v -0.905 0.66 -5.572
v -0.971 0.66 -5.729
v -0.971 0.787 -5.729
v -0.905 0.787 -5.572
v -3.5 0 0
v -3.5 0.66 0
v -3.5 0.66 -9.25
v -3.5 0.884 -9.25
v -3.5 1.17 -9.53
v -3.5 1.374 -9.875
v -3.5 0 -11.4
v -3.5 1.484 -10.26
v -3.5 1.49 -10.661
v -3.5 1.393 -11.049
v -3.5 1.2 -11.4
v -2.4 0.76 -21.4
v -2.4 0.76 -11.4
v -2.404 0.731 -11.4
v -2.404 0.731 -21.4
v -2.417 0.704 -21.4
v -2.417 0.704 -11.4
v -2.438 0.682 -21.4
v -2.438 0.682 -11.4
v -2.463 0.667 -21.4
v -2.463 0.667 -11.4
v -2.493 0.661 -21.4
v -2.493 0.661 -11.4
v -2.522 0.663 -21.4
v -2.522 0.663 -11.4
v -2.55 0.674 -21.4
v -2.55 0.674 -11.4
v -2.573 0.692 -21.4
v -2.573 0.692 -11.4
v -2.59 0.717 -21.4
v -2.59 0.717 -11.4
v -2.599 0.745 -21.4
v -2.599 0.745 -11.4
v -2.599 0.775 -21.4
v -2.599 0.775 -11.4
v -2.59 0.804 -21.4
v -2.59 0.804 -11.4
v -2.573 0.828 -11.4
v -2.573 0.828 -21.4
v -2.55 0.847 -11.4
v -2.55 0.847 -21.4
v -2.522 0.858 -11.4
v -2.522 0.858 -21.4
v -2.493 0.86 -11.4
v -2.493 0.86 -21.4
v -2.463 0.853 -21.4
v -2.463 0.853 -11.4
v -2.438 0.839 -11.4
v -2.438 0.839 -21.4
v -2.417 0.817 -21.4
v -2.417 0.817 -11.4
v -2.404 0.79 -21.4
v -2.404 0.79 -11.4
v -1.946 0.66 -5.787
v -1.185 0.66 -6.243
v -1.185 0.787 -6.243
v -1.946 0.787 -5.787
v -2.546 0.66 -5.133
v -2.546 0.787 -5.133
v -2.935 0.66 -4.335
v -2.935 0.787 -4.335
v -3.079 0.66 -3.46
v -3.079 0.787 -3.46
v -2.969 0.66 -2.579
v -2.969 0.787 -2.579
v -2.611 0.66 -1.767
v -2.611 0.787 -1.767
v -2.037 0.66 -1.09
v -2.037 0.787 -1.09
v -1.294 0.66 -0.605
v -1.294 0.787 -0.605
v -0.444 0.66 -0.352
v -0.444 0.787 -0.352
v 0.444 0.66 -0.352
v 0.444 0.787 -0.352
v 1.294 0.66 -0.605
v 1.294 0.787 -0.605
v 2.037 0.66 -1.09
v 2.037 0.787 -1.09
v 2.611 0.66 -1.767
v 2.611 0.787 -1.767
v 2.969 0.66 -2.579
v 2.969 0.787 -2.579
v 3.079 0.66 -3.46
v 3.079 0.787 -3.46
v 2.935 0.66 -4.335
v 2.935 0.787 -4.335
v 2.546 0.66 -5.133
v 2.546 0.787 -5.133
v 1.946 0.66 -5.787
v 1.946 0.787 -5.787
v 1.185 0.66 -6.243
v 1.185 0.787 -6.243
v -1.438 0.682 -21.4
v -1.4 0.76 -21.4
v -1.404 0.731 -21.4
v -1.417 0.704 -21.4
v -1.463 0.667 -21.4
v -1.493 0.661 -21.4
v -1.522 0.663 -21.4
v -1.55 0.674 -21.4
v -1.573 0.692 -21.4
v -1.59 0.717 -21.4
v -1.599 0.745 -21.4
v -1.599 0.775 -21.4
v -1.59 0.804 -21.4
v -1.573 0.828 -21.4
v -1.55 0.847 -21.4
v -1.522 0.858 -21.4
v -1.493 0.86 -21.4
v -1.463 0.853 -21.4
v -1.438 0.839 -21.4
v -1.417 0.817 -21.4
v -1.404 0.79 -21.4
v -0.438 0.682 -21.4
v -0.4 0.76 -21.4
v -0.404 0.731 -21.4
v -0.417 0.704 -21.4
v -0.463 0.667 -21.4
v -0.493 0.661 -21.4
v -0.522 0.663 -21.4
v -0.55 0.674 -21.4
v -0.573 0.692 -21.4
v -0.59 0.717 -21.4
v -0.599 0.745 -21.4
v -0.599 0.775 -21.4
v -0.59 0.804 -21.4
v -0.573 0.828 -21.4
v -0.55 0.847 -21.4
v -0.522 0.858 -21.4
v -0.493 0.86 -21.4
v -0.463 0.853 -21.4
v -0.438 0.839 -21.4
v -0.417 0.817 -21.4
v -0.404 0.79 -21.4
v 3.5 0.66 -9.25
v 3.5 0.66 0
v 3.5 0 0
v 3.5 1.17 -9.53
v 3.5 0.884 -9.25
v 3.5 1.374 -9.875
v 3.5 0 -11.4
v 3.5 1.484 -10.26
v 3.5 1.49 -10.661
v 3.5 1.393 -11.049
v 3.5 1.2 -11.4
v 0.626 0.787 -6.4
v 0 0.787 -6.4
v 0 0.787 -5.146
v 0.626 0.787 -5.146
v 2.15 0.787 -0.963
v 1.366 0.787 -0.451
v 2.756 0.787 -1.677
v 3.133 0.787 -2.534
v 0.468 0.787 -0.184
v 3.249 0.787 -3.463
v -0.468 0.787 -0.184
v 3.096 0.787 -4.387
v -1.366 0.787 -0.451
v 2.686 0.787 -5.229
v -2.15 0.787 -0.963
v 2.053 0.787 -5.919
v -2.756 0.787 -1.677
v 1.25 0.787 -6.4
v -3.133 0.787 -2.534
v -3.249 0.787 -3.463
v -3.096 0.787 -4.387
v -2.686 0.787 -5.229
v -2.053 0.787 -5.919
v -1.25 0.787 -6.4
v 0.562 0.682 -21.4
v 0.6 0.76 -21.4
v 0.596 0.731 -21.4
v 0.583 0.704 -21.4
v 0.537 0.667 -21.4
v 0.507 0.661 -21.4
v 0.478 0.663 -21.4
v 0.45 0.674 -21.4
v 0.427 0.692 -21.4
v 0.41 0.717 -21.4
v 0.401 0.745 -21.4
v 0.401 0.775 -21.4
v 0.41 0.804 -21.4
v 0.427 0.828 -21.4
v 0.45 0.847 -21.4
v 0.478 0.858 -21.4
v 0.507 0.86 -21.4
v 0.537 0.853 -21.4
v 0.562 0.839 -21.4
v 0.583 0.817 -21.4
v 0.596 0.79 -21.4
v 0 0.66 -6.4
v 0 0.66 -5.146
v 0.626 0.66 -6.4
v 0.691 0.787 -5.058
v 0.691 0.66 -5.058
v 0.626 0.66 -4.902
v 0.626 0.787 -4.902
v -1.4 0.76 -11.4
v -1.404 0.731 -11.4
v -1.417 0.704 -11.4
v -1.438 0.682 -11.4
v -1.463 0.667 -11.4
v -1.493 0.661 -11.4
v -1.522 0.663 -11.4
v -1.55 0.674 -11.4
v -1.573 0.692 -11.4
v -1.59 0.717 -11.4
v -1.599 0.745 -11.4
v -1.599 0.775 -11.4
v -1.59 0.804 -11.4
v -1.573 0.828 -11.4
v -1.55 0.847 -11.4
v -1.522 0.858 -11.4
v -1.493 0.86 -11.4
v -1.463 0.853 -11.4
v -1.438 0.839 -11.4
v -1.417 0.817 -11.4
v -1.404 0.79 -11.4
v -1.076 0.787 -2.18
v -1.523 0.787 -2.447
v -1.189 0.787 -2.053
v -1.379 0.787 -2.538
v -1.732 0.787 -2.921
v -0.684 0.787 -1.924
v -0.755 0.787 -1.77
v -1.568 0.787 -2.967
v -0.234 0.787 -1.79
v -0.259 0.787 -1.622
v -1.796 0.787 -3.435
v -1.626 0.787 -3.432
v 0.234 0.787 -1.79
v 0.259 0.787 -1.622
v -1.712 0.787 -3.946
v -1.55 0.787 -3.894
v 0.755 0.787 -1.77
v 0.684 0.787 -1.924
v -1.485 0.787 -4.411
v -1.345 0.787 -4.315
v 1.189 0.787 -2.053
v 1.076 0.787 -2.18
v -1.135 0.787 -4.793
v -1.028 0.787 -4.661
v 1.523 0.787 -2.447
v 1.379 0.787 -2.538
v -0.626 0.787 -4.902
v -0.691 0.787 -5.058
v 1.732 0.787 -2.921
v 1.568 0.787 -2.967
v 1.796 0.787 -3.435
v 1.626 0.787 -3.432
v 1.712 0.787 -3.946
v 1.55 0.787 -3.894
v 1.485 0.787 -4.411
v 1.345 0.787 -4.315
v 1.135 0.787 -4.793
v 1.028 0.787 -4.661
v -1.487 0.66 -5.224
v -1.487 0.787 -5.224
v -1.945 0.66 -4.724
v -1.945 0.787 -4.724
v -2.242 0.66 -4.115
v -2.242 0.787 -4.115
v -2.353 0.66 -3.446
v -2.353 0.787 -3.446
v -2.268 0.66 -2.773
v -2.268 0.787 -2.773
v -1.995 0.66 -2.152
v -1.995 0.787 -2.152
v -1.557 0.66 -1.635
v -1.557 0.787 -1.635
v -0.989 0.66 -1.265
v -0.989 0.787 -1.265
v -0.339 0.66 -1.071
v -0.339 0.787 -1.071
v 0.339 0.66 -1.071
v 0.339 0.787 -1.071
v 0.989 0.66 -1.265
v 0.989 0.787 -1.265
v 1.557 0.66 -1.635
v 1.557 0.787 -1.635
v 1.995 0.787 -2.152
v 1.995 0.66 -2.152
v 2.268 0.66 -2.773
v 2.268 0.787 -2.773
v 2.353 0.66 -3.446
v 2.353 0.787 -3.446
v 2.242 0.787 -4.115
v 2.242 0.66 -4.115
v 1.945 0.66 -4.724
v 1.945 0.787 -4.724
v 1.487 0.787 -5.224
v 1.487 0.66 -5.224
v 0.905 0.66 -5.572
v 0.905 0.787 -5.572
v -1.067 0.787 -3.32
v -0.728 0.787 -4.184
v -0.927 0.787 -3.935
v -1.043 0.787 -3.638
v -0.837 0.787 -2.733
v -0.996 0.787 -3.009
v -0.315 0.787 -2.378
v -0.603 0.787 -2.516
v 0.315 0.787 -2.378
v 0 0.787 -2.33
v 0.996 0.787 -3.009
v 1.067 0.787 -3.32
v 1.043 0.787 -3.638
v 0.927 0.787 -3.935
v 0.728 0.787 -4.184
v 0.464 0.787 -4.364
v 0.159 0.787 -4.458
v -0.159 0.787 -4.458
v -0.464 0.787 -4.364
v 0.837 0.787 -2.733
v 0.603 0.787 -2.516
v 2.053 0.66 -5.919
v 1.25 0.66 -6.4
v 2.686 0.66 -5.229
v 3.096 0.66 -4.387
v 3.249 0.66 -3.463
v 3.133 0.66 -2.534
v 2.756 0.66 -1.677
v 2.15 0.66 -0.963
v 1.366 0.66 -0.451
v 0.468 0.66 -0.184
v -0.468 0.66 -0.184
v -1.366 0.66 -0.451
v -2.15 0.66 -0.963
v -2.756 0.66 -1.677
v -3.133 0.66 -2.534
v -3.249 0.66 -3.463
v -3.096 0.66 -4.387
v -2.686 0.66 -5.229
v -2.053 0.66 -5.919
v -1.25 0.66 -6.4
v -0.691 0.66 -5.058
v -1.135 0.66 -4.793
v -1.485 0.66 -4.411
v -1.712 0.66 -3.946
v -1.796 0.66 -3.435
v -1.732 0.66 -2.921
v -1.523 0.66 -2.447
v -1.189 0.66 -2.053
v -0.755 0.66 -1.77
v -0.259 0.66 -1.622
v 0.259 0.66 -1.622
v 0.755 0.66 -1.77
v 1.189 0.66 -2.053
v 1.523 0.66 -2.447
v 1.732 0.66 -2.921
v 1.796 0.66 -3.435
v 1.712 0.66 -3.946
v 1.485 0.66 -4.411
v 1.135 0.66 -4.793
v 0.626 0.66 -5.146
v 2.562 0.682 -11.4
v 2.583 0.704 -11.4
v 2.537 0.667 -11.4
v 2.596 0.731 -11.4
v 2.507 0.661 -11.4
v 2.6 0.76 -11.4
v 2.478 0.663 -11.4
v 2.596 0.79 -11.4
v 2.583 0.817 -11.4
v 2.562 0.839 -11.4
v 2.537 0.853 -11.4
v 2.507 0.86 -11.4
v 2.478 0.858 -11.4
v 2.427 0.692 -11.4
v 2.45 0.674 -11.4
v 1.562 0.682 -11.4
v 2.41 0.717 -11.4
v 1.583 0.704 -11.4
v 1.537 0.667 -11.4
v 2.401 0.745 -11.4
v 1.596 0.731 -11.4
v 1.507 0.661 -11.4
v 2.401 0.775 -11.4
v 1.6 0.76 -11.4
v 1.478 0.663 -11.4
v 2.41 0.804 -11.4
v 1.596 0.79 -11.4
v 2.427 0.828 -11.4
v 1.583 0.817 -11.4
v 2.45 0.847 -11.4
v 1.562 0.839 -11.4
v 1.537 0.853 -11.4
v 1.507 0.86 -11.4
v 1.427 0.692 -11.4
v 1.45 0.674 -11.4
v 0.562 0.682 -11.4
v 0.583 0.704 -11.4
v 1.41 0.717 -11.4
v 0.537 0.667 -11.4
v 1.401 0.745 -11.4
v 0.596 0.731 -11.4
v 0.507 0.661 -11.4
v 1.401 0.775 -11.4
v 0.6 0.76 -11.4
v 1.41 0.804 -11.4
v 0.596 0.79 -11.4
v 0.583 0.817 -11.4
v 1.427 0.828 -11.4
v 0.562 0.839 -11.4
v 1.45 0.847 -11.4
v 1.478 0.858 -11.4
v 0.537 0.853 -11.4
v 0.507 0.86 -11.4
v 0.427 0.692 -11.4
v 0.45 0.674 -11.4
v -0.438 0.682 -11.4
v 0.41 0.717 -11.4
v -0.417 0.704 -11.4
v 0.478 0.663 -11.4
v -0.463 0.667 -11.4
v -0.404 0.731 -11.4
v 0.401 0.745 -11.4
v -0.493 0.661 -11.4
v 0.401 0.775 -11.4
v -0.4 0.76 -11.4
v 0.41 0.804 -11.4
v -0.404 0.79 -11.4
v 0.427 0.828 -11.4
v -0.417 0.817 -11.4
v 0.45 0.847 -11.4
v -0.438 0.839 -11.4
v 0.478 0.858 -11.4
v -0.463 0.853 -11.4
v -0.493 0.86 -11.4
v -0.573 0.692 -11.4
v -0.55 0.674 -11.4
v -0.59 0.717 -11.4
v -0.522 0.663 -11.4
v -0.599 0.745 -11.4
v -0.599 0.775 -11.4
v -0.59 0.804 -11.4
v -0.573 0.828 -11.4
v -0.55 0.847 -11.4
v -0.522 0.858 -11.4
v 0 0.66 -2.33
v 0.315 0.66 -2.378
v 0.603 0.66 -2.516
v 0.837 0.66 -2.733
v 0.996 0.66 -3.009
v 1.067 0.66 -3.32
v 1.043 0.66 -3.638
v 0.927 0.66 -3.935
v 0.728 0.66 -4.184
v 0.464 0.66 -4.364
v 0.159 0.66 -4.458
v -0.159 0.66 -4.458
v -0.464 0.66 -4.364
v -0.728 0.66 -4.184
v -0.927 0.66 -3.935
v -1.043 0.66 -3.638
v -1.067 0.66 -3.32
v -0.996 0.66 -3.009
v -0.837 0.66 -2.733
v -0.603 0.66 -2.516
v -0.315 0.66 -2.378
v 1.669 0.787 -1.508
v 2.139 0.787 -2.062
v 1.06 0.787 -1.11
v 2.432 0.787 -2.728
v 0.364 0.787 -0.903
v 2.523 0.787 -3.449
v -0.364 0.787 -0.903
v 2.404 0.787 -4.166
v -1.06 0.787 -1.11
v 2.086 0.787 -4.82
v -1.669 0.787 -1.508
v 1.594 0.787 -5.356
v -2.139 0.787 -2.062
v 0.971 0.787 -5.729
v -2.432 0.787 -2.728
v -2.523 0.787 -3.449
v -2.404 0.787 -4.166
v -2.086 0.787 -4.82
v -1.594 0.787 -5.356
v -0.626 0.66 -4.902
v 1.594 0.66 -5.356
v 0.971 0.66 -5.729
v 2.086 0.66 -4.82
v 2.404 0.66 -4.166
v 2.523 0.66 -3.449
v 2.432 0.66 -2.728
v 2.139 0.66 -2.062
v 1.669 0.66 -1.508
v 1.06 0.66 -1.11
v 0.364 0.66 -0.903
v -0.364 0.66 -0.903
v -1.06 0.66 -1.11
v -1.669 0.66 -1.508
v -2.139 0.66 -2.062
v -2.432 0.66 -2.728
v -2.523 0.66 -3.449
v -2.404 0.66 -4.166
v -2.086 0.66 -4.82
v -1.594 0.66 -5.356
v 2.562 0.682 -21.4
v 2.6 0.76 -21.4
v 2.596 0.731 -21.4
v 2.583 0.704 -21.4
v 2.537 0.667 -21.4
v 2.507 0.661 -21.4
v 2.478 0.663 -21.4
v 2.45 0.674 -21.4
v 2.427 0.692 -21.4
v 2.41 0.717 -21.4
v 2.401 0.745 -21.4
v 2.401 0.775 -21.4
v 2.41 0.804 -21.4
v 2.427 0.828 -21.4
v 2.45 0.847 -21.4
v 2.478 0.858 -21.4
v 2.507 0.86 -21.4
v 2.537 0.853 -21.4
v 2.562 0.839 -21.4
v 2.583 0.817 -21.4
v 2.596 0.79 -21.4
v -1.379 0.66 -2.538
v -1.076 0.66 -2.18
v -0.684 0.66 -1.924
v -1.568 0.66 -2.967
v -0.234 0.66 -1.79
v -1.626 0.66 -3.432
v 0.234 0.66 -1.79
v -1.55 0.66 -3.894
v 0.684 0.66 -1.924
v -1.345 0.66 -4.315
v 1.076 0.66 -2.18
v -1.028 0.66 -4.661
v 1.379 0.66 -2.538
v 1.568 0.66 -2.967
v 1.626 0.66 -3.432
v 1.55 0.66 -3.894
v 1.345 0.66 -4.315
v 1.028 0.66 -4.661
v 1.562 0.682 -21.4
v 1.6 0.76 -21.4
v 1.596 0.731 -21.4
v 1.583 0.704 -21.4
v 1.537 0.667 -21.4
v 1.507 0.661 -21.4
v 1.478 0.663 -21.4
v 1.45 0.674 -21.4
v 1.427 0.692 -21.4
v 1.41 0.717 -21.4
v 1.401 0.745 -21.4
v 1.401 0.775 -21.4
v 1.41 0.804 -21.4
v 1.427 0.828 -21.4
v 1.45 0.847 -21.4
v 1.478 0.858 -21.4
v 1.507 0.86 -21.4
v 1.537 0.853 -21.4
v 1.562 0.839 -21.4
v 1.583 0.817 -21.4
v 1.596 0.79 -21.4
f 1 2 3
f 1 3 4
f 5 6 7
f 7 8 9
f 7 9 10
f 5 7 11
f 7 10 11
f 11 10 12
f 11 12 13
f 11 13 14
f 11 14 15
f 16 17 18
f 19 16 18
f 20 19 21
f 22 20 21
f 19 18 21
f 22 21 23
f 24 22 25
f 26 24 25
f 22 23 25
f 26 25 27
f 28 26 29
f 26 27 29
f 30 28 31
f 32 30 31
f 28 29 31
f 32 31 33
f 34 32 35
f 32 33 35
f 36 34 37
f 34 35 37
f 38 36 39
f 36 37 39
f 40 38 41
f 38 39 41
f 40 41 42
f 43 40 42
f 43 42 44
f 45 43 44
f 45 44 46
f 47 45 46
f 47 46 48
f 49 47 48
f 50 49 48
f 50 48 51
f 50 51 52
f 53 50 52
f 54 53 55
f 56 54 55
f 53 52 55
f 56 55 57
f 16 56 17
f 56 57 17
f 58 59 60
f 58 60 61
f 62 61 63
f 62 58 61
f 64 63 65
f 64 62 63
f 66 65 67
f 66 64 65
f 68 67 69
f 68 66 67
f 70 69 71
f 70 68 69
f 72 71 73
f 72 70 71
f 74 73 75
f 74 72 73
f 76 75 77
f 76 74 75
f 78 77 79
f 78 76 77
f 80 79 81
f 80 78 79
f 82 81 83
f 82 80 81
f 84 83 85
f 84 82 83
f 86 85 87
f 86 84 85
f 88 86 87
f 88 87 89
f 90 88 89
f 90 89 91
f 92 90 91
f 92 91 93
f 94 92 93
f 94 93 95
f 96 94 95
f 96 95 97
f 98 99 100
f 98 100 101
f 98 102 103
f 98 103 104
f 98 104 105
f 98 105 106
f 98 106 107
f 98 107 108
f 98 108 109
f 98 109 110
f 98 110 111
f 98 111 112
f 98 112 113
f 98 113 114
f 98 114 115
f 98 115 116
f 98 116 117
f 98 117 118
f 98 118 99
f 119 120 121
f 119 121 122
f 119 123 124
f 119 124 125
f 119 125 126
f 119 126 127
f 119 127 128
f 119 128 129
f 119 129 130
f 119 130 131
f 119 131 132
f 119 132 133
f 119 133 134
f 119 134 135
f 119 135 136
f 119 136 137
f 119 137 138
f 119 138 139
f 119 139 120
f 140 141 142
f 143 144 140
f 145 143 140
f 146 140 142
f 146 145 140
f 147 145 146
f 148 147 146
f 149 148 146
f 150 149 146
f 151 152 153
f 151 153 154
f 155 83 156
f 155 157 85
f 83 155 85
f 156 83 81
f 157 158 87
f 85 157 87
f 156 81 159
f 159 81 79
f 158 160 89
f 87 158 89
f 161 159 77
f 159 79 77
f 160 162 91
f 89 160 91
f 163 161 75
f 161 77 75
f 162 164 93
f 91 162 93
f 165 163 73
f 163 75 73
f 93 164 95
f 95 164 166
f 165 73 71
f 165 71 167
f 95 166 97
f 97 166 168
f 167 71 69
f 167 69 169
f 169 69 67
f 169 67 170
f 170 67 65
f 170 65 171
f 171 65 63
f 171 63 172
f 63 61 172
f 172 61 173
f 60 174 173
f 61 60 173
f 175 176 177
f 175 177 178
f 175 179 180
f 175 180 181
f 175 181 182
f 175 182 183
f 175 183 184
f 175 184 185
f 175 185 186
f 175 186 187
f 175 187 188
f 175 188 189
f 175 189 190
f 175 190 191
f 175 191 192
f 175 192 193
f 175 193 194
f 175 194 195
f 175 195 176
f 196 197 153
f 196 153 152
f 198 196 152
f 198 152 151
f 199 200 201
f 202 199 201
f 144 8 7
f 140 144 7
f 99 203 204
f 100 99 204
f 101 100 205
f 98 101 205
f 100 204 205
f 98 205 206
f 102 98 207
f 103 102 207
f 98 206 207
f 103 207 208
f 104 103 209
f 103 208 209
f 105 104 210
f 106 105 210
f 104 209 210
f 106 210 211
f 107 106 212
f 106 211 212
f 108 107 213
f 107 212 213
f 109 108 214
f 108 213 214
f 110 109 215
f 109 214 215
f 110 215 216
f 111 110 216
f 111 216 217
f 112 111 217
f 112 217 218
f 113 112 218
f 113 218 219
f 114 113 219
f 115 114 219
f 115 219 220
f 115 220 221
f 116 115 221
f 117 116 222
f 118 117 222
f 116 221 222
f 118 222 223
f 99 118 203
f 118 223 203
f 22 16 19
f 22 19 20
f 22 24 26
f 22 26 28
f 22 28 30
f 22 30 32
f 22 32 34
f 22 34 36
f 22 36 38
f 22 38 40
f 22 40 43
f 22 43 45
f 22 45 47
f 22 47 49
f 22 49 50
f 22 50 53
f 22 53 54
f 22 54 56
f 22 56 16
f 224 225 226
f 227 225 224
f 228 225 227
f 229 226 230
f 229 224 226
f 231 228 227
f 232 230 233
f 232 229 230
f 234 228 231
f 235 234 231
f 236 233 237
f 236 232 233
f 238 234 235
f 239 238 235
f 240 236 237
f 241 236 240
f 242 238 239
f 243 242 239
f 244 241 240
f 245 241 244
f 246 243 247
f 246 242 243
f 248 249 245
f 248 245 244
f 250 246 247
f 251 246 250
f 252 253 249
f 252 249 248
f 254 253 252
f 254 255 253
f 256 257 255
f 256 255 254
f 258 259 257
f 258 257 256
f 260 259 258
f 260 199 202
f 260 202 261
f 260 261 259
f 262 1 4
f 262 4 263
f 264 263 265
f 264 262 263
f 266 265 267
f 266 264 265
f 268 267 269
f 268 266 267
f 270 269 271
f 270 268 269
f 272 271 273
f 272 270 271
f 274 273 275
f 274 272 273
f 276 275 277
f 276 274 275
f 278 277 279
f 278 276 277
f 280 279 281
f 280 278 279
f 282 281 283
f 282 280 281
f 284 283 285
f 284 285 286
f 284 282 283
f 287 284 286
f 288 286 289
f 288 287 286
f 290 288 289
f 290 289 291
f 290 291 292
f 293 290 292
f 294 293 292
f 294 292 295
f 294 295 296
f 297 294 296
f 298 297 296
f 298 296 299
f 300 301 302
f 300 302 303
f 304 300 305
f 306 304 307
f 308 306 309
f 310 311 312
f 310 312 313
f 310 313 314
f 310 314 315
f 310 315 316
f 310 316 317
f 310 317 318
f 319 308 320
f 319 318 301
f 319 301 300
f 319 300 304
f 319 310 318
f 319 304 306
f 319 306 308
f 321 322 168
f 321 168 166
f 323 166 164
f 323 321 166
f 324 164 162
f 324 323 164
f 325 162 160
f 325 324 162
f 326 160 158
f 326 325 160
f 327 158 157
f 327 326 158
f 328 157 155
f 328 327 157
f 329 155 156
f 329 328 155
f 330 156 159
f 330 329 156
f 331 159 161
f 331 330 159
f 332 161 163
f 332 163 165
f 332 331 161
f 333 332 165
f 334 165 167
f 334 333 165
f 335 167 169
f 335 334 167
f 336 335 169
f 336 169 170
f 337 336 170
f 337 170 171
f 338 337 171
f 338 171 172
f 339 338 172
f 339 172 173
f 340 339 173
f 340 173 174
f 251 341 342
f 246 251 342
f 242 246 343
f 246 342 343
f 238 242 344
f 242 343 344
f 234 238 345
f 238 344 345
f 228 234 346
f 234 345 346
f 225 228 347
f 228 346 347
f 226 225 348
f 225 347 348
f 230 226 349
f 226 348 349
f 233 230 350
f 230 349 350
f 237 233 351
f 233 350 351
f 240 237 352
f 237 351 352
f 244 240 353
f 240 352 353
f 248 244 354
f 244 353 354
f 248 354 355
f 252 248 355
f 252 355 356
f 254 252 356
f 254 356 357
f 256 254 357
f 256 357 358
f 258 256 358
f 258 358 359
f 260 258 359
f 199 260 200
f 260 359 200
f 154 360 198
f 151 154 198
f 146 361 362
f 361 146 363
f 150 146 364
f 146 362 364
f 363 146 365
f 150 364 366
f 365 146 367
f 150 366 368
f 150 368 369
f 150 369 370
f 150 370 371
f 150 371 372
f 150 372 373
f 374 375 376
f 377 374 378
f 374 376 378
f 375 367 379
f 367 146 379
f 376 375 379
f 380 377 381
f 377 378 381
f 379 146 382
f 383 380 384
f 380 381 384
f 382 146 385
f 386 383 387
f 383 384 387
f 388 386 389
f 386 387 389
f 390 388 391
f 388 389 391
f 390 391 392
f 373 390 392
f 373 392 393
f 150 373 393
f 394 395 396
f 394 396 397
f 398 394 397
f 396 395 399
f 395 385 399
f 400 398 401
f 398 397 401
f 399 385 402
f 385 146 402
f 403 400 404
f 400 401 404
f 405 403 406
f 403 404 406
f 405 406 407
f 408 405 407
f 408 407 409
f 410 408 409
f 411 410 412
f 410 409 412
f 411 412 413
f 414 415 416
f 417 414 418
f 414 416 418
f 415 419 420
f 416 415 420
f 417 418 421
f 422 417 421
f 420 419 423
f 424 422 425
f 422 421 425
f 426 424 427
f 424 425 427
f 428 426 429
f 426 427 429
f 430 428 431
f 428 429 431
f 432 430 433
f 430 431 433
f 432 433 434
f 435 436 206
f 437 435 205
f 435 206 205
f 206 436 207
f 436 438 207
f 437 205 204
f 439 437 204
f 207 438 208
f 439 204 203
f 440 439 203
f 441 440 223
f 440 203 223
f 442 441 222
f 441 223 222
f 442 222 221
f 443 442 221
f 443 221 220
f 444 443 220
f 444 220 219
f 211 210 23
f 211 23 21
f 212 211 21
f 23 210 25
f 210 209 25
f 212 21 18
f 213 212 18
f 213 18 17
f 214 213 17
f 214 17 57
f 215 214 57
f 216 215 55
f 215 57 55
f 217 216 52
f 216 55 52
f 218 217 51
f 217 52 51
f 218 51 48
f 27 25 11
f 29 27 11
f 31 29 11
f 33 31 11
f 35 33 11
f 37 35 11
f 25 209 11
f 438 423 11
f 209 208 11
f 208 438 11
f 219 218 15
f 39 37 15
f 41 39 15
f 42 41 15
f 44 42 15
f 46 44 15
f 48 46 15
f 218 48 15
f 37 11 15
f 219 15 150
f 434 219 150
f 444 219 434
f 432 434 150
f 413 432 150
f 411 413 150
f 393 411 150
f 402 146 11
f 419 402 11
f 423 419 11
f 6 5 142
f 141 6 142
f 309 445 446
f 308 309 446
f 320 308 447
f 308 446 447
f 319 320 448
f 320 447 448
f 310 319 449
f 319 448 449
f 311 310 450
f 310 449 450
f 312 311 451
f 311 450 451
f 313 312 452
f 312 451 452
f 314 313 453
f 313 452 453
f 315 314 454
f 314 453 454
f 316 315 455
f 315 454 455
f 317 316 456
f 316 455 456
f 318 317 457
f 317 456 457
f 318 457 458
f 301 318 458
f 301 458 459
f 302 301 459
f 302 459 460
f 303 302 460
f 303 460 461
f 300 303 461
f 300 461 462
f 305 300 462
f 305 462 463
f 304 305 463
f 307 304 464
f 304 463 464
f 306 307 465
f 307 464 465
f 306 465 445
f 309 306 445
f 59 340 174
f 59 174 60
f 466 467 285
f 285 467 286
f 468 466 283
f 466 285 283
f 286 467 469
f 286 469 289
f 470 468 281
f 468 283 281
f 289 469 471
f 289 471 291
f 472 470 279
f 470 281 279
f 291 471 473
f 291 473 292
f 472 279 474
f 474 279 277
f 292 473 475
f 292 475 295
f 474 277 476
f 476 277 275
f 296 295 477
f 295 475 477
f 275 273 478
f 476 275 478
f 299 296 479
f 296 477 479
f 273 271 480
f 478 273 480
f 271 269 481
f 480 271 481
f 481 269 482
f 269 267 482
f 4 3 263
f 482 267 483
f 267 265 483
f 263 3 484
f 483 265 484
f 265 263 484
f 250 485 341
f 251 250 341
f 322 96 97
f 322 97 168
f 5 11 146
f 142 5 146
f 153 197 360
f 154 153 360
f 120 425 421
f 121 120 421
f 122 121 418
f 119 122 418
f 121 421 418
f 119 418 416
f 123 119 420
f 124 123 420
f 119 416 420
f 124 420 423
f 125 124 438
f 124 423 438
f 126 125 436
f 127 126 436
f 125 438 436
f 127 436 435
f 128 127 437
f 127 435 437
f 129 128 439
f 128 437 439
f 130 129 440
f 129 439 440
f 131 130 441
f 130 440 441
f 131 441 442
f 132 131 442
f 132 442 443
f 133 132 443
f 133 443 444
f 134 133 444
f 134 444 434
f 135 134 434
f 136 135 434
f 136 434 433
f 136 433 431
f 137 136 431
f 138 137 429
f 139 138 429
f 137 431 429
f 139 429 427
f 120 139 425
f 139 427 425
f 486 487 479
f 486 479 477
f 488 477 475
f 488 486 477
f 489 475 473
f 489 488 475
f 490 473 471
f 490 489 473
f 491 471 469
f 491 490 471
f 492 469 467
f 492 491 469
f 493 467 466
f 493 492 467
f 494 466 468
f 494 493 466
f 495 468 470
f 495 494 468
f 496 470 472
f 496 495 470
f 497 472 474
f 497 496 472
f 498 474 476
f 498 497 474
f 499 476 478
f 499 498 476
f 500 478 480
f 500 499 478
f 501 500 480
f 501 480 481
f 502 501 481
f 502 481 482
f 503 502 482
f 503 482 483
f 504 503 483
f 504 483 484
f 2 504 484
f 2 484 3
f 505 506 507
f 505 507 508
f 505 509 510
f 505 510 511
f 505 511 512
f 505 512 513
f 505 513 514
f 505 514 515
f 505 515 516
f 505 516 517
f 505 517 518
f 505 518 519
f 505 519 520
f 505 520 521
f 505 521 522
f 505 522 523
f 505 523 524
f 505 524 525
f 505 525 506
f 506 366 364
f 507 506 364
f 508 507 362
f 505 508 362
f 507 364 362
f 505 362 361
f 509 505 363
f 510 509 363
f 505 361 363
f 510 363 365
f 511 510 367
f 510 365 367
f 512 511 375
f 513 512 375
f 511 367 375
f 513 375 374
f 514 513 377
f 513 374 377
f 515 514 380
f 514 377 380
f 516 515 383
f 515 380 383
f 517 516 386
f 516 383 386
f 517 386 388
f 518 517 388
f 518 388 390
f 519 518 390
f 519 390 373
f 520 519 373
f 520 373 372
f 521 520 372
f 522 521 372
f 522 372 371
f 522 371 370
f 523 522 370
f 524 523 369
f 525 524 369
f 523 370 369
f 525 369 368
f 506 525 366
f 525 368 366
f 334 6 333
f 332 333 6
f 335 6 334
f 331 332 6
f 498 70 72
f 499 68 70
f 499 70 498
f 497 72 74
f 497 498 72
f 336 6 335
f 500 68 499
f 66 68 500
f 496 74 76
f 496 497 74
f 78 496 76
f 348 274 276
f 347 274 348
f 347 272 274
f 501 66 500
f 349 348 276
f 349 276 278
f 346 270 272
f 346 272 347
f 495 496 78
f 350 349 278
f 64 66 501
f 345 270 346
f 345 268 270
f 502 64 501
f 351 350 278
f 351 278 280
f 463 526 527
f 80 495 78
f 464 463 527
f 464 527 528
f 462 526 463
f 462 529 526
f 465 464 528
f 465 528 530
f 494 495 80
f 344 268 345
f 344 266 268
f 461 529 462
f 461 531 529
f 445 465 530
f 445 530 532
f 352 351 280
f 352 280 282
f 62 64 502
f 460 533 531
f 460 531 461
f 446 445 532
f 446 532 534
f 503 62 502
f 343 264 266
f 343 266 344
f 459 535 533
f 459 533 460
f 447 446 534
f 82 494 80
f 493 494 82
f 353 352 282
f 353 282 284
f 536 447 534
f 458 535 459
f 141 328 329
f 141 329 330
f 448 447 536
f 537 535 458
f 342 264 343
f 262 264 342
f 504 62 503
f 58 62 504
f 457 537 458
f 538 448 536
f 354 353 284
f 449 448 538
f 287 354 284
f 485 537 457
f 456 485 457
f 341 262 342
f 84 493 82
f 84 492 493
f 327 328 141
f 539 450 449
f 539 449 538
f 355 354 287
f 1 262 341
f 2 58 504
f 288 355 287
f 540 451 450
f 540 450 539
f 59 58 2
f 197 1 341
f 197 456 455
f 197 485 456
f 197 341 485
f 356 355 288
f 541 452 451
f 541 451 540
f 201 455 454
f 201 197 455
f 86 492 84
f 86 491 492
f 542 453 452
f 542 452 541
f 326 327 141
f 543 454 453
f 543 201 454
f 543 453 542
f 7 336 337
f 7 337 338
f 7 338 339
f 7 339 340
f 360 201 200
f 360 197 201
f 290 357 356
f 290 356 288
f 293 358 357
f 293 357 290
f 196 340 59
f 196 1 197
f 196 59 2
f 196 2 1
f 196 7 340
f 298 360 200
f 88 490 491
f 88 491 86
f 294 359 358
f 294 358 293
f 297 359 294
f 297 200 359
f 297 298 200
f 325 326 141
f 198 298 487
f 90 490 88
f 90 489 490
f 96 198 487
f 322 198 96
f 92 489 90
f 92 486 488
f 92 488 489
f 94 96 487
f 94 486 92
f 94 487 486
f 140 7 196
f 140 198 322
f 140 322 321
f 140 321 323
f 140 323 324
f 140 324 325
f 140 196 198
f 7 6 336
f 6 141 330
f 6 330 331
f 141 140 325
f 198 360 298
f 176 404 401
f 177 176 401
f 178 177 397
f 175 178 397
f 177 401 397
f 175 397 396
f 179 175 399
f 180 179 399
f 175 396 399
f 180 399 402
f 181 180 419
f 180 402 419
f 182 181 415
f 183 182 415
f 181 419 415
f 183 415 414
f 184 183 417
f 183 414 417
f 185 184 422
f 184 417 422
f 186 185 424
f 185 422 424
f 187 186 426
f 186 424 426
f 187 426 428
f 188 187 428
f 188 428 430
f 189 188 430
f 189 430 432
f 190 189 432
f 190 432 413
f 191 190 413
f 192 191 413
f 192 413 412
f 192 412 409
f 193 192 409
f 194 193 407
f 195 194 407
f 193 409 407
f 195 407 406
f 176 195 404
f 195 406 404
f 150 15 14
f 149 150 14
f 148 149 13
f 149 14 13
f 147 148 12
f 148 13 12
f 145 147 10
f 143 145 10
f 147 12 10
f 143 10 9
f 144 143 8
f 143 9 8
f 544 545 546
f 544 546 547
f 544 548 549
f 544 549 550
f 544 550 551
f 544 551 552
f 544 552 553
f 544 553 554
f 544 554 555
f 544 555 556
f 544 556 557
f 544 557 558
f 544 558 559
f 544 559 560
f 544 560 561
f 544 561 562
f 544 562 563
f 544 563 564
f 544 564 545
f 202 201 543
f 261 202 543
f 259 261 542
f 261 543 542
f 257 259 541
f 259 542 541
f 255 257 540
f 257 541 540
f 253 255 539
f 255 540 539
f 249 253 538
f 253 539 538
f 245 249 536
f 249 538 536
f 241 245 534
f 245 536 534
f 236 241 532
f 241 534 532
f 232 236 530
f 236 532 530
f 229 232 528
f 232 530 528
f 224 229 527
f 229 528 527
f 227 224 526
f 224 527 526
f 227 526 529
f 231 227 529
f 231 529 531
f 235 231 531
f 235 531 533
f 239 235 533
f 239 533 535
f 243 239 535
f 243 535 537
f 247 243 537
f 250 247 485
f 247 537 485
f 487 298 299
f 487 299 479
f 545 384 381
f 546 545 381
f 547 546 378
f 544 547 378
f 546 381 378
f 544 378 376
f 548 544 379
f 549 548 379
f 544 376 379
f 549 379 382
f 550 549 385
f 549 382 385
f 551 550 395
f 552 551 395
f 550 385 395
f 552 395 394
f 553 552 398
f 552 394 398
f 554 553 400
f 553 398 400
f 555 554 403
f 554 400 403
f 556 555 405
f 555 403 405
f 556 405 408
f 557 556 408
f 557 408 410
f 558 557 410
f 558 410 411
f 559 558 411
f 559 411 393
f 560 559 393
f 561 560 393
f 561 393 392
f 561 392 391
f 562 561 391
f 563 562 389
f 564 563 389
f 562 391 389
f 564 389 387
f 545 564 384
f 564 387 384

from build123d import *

# Parameters (mm, degrees)
SKETCH1_W           = 7
SKETCH1_H           = 11.4
BOSS_EXTRUDE1_DEPTH = 0.6604
BOSS_EXTRUDE2_DEPTH = 7
SKETCH4_R           = 1.07
SKETCH4_W           = 0.625641059
SKETCH4_H           = 1.254110087
BOSS_EXTRUDE3_DEPTH = 0.127
SKETCH5_R           = 0.1
BOSS_EXTRUDE4_DEPTH = 10


with BuildPart() as part:
    # Sketch1 → Boss-Extrude1 (new body)
    with BuildSketch(Plane(origin=(0, 0, 0), x_dir=(1, 0, 0), z_dir=(0, 1, 0))):
        with Locations((0, 5.7)):
            Rectangle(SKETCH1_W, SKETCH1_H)
    extrude(amount=BOSS_EXTRUDE1_DEPTH)

    # Sketch3 → Boss-Extrude2 (add)
    with BuildSketch(Plane.ZY.offset(3.5)):
        with BuildLine():
            Line((-11.4, 0.6604), (-11.4, 1.2))
            ThreePointArc((-11.4, 1.2), (-10.260013654, 1.483539887), (-9.25, 0.883676442))
            Line((-9.25, 0.883676442), (-9.25, 0.6604))
            Line((-9.25, 0.6604), (-11.4, 0.6604))
        make_face()
    extrude(amount=-BOSS_EXTRUDE2_DEPTH)

    # Sketch4 → Boss-Extrude3 (add)
    with BuildSketch(Plane(origin=(0, 0.6604, 0), x_dir=(1, 0, 0), z_dir=(0, 1, 0))):
        with Locations(Location((0, 3.4, 0), (0, 0, 270))):
            Circle(SKETCH4_R)
        with Locations((0.312820529, 5.772944956)):
            Rectangle(SKETCH4_W, SKETCH4_H)
        with BuildLine():
            Line((-0.625641059, 4.901538541), (-0.691025641, 5.058461538))
            ThreePointArc((-0.691025641, 5.058461538), (0, 1.603333333), (0.691025641, 5.058461538))
            Line((0.691025641, 5.058461538), (0.625641059, 4.901538541))
            ThreePointArc((0.625641059, 4.901538541), (0, 1.773333247), (-0.625641059, 4.901538541))
        make_face()
        with BuildLine():
            Line((0.905128238, 5.572307772), (0.970512821, 5.729230769))
            ThreePointArc((0.970512821, 5.729230769), (0, 0.876666667), (-0.970512821, 5.729230769))
            Line((-0.970512821, 5.729230769), (-0.905128238, 5.572307772))
            ThreePointArc((-0.905128238, 5.572307772), (0, 1.046666581), (0.905128238, 5.572307772))
        make_face()
        with BuildLine():
            Line((1.184615418, 6.243077002), (1.25, 6.4))
            ThreePointArc((1.25, 6.4), (0, 0.15), (-1.25, 6.4))
            Line((-1.25, 6.4), (-1.184615418, 6.243077002))
            ThreePointArc((-1.184615418, 6.243077002), (0, 0.319999914), (1.184615418, 6.243077002))
        make_face()
    extrude(amount=BOSS_EXTRUDE3_DEPTH)

    # Sketch5 → Boss-Extrude4 (add)
    with BuildSketch(Plane(origin=(0, 0, -11.4), x_dir=(-1, 0, 0), z_dir=(0, 0, -1))):
        with Locations(Location((-2.5, 0.7604, 0), (0, 0, 180))):
            Circle(SKETCH5_R)
        with Locations(Location((-1.5, 0.7604, 0), (0, 0, 180))):
            Circle(SKETCH5_R)
        with Locations(Location((-0.5, 0.7604, 0), (0, 0, 180))):
            Circle(SKETCH5_R)
        with Locations(Location((0.5, 0.7604, 0), (0, 0, 180))):
            Circle(SKETCH5_R)
        with Locations(Location((1.5, 0.7604, 0), (0, 0, 180))):
            Circle(SKETCH5_R)
        with Locations(Location((2.5, 0.7604, 0), (0, 0, 180))):
            Circle(SKETCH5_R)
    extrude(amount=BOSS_EXTRUDE4_DEPTH)


solid = part.part
